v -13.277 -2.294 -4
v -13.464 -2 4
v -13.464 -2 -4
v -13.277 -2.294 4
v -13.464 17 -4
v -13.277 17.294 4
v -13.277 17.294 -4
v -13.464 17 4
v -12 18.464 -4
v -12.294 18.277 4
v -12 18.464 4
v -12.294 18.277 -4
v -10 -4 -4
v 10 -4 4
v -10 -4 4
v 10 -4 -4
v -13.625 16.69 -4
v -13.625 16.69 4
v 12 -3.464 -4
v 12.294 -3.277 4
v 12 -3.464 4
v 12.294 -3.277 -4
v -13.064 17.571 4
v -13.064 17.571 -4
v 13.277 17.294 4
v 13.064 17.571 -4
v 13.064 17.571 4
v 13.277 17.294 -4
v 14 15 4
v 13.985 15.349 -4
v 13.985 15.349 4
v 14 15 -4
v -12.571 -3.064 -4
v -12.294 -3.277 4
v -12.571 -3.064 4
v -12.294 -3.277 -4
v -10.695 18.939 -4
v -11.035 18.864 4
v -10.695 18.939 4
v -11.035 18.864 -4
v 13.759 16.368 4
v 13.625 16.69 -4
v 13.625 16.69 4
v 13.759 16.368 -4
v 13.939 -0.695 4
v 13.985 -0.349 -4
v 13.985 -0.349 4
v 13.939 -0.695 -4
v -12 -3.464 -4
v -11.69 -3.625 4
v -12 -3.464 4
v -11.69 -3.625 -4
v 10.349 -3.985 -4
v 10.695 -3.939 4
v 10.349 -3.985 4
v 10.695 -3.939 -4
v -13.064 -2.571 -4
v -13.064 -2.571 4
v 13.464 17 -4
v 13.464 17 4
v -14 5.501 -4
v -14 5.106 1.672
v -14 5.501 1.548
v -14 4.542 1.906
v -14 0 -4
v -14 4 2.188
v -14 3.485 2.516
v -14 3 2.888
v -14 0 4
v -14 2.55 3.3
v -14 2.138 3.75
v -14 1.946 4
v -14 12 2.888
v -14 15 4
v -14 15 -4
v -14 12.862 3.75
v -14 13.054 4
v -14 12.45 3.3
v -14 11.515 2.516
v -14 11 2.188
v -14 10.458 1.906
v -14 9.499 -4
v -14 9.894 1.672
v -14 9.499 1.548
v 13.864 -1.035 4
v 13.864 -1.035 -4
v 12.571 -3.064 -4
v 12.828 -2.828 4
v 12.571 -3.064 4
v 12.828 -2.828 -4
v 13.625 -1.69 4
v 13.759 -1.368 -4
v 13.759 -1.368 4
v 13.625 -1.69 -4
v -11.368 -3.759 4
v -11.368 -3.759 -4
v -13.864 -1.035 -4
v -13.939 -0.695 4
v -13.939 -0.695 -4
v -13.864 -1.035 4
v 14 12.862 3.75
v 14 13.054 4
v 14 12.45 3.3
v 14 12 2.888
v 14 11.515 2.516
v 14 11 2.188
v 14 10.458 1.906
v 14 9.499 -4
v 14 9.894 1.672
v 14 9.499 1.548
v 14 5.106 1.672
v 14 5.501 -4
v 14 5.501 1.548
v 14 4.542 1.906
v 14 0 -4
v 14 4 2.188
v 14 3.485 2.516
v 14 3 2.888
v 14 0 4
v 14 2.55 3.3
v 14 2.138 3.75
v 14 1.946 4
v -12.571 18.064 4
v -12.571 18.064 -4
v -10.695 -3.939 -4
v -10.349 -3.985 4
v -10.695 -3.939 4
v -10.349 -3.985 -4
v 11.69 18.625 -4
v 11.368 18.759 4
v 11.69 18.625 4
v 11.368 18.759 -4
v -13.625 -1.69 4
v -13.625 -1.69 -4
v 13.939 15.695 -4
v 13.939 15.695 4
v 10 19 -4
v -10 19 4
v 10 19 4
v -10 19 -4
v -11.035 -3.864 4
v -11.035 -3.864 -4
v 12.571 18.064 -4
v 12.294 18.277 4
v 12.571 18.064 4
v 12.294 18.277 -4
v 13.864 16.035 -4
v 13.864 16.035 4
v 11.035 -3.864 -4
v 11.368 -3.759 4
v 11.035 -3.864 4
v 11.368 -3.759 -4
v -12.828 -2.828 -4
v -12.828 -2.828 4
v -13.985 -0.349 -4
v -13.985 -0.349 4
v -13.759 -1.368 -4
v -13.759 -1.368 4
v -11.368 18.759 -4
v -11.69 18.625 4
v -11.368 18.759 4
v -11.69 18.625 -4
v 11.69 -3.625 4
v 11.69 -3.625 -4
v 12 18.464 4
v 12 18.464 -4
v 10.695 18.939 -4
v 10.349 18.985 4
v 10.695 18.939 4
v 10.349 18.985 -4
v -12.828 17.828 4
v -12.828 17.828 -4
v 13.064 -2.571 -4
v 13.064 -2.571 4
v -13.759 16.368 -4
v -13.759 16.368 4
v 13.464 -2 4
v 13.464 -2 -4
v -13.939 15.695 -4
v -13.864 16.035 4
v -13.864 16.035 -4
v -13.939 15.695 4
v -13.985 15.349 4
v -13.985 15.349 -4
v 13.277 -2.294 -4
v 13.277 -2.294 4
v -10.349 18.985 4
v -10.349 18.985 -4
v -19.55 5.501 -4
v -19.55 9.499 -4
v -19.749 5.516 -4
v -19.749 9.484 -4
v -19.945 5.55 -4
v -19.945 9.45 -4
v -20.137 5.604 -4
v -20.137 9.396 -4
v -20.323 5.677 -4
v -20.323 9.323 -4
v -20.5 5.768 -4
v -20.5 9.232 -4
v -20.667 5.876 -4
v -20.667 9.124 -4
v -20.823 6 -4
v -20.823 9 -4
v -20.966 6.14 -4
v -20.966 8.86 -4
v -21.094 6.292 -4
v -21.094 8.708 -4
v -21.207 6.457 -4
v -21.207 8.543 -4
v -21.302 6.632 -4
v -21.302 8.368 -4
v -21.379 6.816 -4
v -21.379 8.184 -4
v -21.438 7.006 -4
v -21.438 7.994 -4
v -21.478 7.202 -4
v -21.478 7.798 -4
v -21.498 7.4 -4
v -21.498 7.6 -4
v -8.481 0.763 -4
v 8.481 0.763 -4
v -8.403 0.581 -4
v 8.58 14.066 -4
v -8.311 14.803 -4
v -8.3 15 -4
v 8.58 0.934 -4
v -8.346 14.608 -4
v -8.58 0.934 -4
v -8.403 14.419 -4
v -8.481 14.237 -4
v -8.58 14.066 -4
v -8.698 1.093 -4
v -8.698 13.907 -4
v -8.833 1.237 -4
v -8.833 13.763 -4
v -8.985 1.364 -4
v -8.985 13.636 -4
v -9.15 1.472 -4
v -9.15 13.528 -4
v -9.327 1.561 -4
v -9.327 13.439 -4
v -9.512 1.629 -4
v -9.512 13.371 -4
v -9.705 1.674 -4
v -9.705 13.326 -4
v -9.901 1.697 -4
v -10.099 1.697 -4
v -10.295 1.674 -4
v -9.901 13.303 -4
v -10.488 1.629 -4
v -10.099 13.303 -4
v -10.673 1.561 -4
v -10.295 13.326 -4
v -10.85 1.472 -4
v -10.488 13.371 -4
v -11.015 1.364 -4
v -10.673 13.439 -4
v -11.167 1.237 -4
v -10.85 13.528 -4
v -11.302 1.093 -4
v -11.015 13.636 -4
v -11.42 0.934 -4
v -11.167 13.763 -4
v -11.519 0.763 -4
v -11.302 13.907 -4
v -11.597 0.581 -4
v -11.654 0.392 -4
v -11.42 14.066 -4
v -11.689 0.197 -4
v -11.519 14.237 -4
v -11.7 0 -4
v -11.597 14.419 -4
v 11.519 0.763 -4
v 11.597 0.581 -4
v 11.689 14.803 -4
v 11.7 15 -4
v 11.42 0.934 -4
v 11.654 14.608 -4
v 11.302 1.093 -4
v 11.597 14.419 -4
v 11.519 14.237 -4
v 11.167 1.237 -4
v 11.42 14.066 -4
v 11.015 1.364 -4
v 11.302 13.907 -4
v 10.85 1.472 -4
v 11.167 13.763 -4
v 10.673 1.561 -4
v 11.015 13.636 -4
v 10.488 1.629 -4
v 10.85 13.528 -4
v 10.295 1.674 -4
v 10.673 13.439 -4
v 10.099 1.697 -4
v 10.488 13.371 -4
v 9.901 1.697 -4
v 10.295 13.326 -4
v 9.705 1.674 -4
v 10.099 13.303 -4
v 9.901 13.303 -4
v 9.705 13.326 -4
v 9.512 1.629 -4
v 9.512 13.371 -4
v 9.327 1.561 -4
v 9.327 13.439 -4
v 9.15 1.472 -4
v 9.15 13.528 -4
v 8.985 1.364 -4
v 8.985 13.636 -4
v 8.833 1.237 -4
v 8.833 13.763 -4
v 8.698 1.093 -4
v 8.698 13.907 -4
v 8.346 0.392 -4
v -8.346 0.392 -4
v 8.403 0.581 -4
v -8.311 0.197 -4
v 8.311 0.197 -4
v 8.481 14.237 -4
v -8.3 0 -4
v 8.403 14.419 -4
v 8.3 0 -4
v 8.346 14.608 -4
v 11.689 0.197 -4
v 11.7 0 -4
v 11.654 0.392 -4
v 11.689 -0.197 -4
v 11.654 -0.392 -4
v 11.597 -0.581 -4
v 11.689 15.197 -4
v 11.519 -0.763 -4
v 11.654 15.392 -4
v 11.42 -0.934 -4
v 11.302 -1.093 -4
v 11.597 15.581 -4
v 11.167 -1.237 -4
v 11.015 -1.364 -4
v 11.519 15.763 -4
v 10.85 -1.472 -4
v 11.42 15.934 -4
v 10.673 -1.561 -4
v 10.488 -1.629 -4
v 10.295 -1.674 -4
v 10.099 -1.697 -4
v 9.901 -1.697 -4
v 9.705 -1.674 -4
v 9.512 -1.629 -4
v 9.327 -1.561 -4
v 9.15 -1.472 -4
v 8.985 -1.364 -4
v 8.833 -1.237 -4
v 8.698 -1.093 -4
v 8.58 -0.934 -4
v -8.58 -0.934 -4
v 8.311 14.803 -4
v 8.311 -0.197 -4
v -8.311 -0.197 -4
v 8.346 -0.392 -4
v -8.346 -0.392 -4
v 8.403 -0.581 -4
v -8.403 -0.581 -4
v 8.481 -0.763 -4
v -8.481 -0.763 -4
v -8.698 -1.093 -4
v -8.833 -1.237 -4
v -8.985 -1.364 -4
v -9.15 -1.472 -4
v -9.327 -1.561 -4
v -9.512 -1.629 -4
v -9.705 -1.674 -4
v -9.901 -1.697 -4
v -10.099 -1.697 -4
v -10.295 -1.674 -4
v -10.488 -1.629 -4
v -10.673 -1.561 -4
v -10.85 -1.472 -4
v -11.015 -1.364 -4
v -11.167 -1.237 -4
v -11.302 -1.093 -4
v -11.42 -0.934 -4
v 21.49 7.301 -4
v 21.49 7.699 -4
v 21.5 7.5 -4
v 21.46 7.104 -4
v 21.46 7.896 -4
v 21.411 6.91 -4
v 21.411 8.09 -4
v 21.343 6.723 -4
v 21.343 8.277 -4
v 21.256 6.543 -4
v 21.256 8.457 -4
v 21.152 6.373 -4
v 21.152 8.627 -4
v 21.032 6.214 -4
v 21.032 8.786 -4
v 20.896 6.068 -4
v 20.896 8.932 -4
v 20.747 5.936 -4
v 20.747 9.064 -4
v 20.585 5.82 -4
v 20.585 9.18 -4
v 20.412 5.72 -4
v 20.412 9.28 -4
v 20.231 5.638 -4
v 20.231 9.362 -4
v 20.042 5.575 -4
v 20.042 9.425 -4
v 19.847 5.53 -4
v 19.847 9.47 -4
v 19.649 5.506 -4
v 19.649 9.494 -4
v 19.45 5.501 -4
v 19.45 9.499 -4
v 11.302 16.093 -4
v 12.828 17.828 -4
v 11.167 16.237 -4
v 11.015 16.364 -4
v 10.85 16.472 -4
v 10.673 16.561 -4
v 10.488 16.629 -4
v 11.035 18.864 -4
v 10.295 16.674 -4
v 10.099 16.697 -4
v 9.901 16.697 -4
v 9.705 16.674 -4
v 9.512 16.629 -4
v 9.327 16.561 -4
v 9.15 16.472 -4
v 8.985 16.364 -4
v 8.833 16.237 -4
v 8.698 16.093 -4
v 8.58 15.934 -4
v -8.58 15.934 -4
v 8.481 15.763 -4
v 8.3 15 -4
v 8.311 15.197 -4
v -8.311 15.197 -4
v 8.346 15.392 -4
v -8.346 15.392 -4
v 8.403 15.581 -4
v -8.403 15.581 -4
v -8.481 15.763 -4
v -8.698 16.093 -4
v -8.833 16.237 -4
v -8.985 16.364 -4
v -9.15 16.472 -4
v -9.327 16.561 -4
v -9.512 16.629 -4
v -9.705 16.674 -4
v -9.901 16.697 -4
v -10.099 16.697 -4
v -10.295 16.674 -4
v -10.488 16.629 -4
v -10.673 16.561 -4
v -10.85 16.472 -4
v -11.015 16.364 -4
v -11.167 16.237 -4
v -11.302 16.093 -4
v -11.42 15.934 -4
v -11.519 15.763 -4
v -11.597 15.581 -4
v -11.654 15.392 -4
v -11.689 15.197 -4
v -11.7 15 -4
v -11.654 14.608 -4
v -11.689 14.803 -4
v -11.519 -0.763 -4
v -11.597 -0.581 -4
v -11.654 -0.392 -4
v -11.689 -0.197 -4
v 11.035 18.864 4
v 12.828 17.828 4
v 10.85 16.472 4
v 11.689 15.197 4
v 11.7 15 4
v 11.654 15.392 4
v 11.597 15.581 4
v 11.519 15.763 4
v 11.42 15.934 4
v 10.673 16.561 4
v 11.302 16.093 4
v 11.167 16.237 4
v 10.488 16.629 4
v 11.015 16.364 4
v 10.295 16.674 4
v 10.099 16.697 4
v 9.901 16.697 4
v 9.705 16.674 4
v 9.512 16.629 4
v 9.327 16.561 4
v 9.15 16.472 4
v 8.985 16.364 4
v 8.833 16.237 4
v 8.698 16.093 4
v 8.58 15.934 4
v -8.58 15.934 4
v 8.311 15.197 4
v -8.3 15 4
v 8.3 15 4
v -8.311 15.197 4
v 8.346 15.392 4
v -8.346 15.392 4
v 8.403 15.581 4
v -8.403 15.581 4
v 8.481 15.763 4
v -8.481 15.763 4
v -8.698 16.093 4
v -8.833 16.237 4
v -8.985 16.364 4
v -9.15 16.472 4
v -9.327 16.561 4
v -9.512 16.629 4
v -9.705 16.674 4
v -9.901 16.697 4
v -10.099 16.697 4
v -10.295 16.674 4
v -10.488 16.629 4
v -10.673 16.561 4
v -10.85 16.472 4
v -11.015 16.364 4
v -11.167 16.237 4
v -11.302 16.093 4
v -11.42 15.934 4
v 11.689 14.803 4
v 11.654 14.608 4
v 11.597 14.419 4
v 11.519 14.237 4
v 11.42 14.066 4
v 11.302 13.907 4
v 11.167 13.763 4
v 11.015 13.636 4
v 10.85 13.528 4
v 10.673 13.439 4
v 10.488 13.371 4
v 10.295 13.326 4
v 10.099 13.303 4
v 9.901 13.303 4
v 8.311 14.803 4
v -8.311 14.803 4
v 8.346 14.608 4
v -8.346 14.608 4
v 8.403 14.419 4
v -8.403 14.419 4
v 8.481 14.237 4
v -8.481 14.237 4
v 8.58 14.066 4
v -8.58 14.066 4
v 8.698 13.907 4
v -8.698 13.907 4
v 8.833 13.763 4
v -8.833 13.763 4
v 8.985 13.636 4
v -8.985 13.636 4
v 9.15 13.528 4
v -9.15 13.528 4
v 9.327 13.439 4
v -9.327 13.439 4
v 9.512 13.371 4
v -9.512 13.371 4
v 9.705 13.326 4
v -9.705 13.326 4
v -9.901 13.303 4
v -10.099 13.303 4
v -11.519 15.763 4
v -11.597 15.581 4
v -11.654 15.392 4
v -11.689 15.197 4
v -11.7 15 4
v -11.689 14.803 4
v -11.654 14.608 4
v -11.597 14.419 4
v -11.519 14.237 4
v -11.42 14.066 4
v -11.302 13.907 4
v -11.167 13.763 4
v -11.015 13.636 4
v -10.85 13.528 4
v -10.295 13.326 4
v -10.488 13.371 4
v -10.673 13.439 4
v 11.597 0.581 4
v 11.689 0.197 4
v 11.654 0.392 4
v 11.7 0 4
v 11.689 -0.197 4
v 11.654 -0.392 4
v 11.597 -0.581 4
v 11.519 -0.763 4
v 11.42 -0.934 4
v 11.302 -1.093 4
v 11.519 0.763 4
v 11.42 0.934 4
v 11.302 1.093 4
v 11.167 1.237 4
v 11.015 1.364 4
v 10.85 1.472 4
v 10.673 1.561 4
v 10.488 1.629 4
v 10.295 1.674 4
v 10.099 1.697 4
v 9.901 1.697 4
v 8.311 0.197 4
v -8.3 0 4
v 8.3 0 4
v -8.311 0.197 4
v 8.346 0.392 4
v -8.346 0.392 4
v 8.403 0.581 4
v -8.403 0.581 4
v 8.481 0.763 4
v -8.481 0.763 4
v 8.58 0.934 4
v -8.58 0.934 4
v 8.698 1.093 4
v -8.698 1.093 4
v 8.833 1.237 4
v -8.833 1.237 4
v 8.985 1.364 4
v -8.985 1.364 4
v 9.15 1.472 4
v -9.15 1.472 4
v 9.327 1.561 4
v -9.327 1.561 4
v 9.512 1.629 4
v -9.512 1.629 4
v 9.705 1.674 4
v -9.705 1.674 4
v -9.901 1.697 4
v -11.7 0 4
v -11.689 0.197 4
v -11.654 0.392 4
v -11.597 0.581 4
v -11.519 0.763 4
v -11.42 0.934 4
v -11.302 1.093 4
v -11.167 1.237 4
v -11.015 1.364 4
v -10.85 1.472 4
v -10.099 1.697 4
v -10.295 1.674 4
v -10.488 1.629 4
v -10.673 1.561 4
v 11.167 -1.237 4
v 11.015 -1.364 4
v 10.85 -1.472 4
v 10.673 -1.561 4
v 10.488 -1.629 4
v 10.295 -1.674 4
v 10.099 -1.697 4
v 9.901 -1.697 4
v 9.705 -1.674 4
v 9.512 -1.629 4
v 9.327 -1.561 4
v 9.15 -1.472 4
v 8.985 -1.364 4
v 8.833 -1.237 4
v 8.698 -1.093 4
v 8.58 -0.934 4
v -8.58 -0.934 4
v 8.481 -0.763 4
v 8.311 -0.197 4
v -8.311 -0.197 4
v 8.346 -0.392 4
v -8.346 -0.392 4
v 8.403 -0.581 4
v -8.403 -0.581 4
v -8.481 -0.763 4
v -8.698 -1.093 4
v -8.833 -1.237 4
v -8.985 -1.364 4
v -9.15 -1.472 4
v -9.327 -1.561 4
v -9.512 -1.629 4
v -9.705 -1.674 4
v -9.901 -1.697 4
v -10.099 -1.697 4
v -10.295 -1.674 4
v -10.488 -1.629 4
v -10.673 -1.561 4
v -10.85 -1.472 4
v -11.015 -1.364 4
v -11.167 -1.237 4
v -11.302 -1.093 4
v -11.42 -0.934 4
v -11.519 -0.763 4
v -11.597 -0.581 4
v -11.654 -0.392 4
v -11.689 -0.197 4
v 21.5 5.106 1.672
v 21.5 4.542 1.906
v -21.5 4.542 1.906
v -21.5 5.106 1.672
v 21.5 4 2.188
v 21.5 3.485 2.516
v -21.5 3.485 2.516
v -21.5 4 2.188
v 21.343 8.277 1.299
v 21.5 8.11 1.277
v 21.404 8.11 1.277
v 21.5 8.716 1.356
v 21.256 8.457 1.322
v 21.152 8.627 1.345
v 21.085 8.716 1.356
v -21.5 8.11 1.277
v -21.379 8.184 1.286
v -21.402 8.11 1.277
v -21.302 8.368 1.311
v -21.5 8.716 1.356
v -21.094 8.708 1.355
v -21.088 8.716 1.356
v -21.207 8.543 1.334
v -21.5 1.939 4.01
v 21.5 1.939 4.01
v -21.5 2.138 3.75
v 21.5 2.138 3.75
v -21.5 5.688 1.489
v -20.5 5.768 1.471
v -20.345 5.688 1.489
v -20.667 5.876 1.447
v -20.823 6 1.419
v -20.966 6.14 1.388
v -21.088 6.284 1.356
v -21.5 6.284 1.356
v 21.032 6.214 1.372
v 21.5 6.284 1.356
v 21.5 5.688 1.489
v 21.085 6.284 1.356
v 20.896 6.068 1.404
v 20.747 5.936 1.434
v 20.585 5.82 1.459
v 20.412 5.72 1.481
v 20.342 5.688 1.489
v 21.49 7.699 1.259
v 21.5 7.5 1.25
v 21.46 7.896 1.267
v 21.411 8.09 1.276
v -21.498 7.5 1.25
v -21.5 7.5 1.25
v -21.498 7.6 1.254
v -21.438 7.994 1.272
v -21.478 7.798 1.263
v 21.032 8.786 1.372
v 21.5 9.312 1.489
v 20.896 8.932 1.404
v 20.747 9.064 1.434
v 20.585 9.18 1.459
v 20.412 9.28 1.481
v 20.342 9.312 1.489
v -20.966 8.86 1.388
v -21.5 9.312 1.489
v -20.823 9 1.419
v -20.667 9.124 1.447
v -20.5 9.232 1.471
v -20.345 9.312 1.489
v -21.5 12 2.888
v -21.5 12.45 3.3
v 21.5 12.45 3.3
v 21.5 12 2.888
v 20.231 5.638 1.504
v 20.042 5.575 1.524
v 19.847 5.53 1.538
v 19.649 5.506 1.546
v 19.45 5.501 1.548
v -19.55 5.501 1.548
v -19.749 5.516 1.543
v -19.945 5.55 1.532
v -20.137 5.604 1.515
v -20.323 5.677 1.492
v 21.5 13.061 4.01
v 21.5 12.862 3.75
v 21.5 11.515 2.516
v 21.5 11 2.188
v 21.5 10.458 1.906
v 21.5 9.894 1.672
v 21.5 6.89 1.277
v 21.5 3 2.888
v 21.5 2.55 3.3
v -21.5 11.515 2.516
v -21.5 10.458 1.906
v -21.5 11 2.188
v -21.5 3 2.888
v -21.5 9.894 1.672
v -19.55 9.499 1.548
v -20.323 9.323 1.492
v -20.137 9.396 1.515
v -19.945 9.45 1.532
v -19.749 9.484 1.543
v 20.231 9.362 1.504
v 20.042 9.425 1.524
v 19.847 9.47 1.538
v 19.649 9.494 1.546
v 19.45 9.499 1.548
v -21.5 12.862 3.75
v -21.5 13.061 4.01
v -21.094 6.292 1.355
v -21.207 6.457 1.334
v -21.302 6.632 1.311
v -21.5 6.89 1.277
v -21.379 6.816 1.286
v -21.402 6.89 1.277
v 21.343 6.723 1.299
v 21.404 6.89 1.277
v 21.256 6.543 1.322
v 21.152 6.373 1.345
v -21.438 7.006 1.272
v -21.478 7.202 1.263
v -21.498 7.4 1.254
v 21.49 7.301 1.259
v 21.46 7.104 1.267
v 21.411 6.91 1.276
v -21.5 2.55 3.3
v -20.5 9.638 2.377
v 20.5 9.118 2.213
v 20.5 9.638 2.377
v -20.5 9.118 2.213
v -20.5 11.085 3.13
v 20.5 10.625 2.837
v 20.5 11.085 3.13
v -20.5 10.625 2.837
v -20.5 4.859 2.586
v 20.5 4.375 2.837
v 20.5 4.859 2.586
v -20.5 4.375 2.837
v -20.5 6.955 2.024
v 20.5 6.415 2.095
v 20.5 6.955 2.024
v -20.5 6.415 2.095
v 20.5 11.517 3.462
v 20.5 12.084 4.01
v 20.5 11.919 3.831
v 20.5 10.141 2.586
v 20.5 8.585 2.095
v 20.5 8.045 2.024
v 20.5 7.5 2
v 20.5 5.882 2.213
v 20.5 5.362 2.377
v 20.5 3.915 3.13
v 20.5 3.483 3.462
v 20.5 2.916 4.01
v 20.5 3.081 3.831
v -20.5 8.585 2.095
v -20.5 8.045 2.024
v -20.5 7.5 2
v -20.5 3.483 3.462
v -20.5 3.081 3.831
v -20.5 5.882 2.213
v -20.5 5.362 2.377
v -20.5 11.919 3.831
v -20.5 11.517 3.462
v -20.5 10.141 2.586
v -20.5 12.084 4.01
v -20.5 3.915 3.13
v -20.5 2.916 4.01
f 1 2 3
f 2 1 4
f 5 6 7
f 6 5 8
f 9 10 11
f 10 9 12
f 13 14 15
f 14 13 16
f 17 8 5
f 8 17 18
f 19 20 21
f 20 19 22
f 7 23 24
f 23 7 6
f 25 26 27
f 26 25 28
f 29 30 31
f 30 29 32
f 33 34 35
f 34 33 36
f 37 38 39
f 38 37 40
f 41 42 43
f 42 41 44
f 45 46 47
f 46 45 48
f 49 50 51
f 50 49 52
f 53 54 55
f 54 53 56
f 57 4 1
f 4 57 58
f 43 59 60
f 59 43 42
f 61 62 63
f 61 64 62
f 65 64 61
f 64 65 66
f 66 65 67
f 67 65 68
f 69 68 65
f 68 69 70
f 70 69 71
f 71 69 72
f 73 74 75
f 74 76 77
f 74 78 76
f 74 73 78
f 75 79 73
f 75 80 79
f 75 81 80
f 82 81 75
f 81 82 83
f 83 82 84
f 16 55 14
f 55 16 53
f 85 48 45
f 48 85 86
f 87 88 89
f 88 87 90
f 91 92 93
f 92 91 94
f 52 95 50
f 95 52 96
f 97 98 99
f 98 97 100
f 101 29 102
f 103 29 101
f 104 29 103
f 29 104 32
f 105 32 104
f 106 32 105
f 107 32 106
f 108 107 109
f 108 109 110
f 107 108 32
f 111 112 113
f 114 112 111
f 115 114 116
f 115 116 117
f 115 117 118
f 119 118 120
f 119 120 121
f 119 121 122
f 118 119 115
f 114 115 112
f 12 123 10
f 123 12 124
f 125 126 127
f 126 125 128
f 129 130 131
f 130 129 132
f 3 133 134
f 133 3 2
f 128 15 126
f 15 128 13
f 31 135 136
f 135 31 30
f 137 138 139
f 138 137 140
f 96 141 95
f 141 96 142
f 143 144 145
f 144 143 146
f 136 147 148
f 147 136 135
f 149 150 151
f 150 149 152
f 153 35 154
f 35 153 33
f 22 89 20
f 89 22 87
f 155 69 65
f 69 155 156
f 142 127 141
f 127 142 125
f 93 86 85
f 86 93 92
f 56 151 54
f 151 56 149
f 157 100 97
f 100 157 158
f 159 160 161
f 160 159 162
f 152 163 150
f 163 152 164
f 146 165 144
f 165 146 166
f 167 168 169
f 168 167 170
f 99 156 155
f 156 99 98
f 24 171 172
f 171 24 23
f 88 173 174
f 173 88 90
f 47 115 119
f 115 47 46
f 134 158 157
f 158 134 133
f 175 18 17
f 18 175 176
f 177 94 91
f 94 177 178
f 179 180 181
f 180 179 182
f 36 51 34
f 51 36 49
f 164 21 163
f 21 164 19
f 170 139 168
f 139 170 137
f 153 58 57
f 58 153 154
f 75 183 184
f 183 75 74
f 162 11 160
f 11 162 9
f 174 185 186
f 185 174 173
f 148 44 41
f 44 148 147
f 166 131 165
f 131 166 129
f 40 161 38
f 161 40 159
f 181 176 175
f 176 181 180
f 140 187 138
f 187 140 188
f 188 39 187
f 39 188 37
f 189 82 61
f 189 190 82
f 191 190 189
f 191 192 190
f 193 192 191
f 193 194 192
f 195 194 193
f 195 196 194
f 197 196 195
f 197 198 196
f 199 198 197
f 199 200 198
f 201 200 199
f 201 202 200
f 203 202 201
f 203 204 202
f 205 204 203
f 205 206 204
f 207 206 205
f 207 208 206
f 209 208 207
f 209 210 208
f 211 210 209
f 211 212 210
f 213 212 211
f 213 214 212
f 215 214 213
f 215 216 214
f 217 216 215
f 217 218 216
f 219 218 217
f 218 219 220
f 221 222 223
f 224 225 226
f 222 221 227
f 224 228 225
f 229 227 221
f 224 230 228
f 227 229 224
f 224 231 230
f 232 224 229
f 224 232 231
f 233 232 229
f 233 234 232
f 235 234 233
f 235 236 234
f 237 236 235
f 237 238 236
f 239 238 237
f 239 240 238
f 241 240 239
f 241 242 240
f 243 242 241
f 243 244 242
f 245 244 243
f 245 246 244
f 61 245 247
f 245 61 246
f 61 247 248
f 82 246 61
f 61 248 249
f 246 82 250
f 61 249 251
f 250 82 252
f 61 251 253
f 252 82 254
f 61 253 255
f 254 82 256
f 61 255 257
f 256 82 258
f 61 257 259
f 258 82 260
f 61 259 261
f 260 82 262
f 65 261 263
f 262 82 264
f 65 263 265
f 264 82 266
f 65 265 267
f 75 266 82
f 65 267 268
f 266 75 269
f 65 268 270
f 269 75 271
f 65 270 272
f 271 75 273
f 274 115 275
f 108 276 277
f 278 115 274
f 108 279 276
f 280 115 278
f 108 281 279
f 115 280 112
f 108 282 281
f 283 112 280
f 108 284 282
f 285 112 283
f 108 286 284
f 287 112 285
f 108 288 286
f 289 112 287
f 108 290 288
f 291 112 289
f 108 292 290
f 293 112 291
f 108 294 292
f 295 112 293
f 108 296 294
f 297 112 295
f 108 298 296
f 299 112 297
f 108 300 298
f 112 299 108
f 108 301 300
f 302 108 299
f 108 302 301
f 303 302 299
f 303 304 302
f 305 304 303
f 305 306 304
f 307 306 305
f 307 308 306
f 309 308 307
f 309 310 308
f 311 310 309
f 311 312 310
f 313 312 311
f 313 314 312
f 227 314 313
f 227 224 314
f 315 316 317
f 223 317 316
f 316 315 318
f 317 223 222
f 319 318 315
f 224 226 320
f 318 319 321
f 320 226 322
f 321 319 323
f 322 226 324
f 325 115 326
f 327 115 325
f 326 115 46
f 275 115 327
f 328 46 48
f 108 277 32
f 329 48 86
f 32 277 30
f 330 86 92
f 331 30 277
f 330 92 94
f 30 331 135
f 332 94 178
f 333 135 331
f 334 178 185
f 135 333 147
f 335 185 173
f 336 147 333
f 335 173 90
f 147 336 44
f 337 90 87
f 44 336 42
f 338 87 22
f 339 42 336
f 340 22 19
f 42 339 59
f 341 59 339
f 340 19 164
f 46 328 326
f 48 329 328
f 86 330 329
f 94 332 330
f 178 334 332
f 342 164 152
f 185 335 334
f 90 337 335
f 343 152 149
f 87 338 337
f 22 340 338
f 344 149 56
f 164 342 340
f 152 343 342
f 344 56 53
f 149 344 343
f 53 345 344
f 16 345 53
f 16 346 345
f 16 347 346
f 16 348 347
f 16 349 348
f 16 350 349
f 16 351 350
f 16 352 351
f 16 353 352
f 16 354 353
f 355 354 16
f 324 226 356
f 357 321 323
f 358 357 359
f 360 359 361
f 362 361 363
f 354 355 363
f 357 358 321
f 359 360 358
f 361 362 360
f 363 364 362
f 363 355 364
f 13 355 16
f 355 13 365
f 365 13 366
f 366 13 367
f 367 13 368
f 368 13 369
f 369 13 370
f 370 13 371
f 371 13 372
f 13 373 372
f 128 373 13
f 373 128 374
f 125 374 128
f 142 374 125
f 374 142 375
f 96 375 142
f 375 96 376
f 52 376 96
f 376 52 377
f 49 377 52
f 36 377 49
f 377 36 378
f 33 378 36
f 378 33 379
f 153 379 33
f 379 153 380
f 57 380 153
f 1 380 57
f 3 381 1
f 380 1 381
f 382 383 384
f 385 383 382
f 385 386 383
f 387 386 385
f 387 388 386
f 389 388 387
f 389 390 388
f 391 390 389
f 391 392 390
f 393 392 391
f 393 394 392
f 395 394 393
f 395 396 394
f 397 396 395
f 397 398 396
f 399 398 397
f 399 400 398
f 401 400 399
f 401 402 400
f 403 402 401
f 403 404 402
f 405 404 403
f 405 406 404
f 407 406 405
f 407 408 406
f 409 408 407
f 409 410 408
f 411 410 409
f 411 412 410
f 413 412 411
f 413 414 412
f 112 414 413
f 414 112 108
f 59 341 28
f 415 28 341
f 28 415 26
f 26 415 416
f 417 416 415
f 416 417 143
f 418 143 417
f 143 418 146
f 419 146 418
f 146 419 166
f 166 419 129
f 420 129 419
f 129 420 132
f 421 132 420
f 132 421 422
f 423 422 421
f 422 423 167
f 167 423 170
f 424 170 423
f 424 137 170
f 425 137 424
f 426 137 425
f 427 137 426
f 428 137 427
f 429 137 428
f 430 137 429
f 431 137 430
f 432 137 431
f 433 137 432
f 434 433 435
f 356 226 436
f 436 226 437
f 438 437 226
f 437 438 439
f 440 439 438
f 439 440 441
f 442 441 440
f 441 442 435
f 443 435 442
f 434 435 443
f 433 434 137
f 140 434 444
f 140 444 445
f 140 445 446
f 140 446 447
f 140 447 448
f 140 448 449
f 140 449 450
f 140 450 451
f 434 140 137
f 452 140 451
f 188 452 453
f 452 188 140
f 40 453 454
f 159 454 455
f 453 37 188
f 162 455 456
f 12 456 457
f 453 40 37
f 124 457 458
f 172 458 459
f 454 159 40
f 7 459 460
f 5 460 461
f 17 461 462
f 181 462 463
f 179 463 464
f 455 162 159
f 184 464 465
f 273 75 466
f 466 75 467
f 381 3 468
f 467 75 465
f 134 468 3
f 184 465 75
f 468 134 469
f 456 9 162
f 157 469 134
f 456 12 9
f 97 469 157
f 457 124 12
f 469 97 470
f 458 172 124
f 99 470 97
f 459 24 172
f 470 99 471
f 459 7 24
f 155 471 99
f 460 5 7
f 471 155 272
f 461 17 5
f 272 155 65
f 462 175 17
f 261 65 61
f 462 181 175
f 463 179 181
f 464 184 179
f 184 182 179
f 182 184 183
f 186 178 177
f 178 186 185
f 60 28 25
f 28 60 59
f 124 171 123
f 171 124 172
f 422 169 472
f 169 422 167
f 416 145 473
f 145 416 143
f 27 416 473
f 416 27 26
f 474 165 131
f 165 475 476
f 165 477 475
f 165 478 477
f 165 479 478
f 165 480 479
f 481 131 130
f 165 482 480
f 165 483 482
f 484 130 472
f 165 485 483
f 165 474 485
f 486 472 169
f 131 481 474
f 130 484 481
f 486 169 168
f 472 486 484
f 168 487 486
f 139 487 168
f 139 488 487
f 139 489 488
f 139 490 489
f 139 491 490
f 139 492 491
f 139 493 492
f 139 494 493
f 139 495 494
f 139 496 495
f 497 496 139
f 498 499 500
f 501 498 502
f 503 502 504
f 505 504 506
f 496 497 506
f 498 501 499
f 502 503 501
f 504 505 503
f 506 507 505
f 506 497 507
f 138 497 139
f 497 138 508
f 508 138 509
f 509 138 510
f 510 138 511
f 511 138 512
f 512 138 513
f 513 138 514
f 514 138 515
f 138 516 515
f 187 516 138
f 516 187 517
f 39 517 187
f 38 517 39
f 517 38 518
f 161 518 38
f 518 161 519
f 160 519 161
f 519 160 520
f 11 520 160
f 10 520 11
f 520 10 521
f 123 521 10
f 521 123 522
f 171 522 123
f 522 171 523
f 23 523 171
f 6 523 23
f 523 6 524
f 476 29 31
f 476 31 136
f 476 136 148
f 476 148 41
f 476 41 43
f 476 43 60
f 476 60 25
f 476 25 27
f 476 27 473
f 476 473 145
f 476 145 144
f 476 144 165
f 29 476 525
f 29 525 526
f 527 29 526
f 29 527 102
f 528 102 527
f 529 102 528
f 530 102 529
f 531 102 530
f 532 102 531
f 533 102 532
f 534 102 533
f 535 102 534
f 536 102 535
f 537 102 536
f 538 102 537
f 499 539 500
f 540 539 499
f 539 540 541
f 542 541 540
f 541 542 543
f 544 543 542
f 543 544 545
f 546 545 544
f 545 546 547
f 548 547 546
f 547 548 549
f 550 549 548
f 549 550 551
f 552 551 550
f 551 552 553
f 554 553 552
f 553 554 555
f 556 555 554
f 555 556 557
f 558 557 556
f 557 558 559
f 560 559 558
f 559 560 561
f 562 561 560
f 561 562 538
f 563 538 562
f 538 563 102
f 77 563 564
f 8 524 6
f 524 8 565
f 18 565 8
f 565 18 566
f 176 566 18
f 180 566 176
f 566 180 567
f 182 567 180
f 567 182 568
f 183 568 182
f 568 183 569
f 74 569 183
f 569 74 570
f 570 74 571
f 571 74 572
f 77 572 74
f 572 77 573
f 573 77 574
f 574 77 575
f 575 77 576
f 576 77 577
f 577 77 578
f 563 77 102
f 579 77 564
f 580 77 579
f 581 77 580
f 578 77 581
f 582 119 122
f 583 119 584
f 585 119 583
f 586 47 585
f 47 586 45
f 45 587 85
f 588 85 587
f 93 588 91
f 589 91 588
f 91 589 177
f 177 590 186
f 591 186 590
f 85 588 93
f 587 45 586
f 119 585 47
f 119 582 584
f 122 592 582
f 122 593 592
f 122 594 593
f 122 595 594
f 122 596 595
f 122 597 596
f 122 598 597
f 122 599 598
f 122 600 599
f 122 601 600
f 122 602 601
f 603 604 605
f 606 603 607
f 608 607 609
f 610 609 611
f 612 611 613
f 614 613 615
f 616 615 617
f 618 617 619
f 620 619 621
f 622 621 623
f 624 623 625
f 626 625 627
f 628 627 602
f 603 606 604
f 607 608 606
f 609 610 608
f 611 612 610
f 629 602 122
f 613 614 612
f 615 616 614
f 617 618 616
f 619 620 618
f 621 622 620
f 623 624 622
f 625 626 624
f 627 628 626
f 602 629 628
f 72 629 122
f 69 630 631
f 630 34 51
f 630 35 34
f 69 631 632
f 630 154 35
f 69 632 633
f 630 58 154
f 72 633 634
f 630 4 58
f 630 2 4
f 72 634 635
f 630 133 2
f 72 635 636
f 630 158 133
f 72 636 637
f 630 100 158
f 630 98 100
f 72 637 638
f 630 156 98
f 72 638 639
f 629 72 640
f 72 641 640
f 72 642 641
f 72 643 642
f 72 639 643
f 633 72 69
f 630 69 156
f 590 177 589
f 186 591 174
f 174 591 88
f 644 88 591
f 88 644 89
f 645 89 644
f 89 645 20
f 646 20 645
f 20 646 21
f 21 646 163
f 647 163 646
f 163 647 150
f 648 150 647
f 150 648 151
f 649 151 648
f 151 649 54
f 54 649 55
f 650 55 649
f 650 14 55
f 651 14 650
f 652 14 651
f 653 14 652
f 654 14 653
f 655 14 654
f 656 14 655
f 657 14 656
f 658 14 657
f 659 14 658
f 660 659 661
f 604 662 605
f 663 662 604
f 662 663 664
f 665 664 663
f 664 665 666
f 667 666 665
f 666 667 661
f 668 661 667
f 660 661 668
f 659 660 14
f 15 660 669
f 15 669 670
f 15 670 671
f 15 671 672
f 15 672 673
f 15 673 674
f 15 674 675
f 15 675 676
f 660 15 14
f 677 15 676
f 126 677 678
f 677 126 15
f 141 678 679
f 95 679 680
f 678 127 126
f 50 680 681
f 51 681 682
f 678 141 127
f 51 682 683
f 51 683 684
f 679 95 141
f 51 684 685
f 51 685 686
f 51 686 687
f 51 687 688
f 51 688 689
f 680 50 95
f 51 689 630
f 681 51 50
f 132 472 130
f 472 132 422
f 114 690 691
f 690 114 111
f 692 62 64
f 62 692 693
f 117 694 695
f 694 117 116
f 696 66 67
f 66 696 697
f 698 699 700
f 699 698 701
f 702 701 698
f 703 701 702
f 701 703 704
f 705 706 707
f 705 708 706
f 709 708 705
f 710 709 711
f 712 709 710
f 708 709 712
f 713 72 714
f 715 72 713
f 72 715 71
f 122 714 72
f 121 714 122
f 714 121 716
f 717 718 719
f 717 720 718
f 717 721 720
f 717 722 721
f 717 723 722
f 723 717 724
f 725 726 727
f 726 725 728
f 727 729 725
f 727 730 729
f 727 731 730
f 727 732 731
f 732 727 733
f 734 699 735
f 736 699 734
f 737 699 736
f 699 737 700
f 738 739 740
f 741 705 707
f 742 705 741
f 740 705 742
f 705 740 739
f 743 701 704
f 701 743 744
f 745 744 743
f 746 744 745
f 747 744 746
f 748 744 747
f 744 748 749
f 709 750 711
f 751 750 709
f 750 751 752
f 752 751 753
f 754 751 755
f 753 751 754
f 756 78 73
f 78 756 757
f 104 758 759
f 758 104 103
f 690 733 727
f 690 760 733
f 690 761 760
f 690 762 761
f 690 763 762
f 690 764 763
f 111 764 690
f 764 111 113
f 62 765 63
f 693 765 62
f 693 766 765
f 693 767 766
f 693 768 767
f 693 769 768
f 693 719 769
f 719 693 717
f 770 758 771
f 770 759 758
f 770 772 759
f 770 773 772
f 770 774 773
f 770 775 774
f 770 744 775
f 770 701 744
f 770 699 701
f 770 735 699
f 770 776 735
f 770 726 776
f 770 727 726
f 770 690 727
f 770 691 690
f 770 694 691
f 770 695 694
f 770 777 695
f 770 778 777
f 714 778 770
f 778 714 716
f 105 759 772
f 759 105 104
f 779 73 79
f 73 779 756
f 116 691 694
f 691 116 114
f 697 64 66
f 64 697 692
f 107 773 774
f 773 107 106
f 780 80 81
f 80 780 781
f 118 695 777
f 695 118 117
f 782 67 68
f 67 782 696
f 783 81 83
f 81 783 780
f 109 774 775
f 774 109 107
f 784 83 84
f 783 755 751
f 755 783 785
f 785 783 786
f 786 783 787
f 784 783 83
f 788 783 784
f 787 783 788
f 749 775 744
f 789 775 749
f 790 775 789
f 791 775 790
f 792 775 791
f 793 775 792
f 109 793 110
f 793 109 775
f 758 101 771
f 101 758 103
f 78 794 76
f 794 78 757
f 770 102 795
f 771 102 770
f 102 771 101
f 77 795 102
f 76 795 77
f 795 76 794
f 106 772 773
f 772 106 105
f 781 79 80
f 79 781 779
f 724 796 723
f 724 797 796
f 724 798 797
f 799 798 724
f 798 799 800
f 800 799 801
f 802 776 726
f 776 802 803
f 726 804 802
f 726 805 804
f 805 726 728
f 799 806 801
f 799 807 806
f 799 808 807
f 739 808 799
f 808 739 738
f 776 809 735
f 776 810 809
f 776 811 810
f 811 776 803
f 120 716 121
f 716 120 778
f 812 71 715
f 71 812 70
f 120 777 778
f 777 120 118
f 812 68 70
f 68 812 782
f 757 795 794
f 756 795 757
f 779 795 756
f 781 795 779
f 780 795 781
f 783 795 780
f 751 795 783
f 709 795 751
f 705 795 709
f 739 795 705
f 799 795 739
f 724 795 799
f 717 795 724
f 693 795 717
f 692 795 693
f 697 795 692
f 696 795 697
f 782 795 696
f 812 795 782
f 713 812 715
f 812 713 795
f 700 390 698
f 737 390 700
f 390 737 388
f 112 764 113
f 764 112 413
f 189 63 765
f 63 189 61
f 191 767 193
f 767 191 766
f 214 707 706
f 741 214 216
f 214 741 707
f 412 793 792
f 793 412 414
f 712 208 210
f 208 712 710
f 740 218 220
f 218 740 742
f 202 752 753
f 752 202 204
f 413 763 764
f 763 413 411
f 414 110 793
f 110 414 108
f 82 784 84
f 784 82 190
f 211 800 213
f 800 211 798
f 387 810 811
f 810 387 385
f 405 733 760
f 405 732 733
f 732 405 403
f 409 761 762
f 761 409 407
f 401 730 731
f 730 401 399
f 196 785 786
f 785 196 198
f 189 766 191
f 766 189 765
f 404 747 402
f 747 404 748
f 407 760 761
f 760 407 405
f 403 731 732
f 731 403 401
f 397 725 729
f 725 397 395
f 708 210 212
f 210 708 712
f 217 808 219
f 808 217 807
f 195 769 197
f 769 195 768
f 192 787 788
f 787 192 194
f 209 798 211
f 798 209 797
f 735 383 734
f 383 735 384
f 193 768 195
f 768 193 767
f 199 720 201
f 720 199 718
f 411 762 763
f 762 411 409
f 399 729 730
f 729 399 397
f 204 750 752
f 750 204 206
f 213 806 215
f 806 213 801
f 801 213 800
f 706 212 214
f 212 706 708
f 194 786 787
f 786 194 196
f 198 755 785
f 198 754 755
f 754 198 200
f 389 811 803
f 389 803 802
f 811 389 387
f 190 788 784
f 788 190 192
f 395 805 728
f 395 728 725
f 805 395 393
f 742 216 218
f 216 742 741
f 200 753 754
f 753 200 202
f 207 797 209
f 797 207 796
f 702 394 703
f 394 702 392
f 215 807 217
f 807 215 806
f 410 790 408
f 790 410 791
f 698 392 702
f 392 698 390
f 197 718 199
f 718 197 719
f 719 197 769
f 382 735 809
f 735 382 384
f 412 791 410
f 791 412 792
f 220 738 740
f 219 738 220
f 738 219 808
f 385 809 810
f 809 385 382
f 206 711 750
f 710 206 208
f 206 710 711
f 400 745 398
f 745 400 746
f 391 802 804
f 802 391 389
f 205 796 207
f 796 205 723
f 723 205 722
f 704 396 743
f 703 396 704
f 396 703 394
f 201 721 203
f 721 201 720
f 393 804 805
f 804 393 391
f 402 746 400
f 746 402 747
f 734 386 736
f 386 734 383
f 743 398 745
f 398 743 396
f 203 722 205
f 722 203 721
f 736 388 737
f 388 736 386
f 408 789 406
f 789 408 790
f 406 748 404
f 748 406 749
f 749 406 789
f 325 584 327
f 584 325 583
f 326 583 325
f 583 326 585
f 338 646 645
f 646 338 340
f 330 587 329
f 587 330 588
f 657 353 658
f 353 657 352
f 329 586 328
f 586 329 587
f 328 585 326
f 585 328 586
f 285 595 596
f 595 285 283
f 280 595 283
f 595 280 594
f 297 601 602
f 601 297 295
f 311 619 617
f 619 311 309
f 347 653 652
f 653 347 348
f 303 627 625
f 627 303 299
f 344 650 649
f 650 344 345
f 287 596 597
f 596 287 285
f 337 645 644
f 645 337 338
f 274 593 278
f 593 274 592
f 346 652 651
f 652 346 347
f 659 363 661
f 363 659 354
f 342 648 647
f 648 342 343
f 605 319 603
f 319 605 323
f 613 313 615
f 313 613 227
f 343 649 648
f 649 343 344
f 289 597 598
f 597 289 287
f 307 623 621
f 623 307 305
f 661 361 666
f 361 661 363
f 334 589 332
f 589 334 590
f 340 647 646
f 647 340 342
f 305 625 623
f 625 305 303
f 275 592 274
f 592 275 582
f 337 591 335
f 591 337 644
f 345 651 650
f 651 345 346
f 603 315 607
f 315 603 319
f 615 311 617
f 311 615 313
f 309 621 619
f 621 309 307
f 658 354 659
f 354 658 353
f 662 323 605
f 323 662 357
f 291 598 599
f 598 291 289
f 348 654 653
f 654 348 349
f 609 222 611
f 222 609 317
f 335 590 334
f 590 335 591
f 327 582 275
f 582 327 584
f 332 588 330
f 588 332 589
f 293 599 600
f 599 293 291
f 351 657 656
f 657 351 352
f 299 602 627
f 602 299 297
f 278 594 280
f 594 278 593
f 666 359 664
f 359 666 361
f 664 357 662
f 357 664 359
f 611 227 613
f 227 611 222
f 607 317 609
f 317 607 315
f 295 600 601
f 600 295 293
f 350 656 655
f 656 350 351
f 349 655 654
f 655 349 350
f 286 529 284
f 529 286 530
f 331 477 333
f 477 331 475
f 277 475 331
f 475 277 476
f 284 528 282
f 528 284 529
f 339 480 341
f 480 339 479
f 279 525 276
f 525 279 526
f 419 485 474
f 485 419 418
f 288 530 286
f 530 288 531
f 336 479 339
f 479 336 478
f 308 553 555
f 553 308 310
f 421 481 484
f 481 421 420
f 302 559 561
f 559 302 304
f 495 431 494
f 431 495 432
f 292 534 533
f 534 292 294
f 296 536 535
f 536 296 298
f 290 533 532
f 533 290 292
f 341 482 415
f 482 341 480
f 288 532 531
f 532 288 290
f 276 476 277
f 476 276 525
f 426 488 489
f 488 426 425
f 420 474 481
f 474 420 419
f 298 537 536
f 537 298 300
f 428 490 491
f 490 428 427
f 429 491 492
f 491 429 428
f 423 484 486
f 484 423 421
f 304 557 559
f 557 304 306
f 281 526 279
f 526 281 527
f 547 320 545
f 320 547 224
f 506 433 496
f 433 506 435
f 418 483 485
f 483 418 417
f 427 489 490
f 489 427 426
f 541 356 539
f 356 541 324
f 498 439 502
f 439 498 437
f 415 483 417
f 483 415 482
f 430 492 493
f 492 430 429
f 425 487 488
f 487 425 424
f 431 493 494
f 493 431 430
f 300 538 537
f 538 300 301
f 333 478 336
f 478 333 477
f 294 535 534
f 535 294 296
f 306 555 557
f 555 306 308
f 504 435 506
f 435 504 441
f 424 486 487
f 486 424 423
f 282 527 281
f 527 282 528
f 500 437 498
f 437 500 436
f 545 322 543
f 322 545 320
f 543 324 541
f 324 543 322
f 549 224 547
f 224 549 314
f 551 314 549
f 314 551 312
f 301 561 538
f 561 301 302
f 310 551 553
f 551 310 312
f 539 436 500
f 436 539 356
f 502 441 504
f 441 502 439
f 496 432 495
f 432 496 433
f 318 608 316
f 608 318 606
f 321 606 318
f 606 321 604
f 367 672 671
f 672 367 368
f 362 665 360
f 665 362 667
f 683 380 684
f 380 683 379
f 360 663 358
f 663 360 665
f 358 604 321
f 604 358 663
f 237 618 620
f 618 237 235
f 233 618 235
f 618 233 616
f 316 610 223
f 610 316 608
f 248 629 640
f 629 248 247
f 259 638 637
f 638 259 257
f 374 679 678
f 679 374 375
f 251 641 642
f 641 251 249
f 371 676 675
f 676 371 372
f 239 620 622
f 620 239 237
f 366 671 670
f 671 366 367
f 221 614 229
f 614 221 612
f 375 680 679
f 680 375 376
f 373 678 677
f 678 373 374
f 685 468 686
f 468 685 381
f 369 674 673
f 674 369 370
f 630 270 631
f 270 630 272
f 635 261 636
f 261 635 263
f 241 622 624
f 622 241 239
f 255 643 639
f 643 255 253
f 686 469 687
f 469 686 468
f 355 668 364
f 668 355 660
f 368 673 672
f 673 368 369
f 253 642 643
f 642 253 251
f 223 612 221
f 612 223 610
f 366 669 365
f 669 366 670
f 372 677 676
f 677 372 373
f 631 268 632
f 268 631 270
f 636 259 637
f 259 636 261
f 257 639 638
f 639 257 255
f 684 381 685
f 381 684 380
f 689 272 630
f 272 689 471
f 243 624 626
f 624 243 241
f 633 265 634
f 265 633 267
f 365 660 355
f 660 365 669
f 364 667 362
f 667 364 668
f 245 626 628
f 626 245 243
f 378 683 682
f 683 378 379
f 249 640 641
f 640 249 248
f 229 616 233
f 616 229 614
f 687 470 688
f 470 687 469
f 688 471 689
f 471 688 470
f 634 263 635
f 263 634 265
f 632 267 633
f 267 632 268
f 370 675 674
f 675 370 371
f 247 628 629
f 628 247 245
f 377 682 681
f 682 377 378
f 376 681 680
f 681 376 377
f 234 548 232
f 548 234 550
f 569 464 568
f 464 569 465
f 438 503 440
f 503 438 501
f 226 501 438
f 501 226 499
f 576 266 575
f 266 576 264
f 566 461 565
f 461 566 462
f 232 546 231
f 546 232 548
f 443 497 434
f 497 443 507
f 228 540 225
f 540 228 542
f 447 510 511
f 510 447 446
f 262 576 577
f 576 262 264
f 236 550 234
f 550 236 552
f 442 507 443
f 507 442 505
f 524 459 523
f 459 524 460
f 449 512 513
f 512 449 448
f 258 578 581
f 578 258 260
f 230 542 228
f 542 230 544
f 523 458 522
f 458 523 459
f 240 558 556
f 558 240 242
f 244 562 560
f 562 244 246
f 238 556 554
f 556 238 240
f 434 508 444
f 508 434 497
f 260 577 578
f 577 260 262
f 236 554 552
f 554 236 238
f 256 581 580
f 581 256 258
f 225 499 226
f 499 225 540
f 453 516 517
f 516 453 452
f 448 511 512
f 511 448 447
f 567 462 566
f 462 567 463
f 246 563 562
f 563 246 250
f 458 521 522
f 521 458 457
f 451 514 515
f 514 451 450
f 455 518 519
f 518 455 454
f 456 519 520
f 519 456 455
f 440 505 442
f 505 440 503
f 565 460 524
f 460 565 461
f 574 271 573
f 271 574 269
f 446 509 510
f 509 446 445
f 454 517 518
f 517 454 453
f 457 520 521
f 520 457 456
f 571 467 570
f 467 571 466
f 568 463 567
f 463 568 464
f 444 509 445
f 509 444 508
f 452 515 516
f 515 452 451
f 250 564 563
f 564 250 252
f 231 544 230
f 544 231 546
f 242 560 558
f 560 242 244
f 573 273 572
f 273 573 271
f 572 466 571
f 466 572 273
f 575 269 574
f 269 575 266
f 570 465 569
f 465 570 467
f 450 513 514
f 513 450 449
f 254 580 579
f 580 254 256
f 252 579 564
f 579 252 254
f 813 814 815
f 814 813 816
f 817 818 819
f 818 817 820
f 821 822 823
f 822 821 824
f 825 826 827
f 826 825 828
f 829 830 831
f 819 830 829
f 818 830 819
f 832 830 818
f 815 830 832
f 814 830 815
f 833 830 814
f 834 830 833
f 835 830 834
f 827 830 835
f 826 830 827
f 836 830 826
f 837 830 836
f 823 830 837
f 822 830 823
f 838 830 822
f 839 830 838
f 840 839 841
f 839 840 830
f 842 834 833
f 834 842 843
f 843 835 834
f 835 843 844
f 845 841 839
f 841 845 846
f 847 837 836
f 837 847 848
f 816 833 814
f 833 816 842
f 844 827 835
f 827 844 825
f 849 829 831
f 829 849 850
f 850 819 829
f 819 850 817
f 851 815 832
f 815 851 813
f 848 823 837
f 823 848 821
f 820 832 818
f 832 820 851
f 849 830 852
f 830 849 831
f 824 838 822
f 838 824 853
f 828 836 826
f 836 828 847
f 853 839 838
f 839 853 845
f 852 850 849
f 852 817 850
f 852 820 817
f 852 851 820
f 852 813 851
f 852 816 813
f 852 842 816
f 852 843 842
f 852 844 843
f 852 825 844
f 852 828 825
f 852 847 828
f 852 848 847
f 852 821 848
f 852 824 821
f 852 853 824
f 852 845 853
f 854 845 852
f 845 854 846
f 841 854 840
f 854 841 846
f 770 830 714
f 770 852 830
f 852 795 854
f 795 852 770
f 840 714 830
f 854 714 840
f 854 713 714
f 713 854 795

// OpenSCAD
$fa=5; $fs=0.2;

difference(){
    
    union(){
       
        // упор под lm6uu
        hull(){ 
            translate([10, 0, 0]) cylinder(h=8, r=4, center=true); 
            translate([-10, 0, 0]) cylinder(h=8, r=4, center=true);
            translate([10, 15, 0]) cylinder(h=8, r=4, center=true);
            translate([-10, 15, 0]) cylinder(h=8, r=4, center=true);
        }
        
        translate([0, 7.5, 8.25]) rotate([0, 90, 0]) cylinder(h=43, r=7, center=true); // цилиндр под LM6UU
        
        // ребро
        hull(){
            translate([-19.5, 7.5, -1]) cylinder(h=6, r=2, center=true);
            translate([19.5, 7.5, -1]) cylinder(h=6, r=2, center=true);
        }
    }
    
    union(){
        translate([10, 0, 0]) cylinder(h=8.01, r=1.7, center=true); // под прижим lm6uu
        translate([10, 15, 0]) cylinder(h=8.01, r=1.7, center=true);
        translate([-10, 0, 0]) cylinder(h=8.01, r=1.7, center=true);
        translate([-10, 15, 0]) cylinder(h=8.01, r=1.7, center=true);
        
        translate([0, 7.5, 8.25]) rotate([0, 90, 0]) cylinder(h=41, r=6.25, center=true); // паз под LM6UU
        
        translate([-25, -25, 4.01]) cube([50,50,20]); //срезать все сверху
    }
}
